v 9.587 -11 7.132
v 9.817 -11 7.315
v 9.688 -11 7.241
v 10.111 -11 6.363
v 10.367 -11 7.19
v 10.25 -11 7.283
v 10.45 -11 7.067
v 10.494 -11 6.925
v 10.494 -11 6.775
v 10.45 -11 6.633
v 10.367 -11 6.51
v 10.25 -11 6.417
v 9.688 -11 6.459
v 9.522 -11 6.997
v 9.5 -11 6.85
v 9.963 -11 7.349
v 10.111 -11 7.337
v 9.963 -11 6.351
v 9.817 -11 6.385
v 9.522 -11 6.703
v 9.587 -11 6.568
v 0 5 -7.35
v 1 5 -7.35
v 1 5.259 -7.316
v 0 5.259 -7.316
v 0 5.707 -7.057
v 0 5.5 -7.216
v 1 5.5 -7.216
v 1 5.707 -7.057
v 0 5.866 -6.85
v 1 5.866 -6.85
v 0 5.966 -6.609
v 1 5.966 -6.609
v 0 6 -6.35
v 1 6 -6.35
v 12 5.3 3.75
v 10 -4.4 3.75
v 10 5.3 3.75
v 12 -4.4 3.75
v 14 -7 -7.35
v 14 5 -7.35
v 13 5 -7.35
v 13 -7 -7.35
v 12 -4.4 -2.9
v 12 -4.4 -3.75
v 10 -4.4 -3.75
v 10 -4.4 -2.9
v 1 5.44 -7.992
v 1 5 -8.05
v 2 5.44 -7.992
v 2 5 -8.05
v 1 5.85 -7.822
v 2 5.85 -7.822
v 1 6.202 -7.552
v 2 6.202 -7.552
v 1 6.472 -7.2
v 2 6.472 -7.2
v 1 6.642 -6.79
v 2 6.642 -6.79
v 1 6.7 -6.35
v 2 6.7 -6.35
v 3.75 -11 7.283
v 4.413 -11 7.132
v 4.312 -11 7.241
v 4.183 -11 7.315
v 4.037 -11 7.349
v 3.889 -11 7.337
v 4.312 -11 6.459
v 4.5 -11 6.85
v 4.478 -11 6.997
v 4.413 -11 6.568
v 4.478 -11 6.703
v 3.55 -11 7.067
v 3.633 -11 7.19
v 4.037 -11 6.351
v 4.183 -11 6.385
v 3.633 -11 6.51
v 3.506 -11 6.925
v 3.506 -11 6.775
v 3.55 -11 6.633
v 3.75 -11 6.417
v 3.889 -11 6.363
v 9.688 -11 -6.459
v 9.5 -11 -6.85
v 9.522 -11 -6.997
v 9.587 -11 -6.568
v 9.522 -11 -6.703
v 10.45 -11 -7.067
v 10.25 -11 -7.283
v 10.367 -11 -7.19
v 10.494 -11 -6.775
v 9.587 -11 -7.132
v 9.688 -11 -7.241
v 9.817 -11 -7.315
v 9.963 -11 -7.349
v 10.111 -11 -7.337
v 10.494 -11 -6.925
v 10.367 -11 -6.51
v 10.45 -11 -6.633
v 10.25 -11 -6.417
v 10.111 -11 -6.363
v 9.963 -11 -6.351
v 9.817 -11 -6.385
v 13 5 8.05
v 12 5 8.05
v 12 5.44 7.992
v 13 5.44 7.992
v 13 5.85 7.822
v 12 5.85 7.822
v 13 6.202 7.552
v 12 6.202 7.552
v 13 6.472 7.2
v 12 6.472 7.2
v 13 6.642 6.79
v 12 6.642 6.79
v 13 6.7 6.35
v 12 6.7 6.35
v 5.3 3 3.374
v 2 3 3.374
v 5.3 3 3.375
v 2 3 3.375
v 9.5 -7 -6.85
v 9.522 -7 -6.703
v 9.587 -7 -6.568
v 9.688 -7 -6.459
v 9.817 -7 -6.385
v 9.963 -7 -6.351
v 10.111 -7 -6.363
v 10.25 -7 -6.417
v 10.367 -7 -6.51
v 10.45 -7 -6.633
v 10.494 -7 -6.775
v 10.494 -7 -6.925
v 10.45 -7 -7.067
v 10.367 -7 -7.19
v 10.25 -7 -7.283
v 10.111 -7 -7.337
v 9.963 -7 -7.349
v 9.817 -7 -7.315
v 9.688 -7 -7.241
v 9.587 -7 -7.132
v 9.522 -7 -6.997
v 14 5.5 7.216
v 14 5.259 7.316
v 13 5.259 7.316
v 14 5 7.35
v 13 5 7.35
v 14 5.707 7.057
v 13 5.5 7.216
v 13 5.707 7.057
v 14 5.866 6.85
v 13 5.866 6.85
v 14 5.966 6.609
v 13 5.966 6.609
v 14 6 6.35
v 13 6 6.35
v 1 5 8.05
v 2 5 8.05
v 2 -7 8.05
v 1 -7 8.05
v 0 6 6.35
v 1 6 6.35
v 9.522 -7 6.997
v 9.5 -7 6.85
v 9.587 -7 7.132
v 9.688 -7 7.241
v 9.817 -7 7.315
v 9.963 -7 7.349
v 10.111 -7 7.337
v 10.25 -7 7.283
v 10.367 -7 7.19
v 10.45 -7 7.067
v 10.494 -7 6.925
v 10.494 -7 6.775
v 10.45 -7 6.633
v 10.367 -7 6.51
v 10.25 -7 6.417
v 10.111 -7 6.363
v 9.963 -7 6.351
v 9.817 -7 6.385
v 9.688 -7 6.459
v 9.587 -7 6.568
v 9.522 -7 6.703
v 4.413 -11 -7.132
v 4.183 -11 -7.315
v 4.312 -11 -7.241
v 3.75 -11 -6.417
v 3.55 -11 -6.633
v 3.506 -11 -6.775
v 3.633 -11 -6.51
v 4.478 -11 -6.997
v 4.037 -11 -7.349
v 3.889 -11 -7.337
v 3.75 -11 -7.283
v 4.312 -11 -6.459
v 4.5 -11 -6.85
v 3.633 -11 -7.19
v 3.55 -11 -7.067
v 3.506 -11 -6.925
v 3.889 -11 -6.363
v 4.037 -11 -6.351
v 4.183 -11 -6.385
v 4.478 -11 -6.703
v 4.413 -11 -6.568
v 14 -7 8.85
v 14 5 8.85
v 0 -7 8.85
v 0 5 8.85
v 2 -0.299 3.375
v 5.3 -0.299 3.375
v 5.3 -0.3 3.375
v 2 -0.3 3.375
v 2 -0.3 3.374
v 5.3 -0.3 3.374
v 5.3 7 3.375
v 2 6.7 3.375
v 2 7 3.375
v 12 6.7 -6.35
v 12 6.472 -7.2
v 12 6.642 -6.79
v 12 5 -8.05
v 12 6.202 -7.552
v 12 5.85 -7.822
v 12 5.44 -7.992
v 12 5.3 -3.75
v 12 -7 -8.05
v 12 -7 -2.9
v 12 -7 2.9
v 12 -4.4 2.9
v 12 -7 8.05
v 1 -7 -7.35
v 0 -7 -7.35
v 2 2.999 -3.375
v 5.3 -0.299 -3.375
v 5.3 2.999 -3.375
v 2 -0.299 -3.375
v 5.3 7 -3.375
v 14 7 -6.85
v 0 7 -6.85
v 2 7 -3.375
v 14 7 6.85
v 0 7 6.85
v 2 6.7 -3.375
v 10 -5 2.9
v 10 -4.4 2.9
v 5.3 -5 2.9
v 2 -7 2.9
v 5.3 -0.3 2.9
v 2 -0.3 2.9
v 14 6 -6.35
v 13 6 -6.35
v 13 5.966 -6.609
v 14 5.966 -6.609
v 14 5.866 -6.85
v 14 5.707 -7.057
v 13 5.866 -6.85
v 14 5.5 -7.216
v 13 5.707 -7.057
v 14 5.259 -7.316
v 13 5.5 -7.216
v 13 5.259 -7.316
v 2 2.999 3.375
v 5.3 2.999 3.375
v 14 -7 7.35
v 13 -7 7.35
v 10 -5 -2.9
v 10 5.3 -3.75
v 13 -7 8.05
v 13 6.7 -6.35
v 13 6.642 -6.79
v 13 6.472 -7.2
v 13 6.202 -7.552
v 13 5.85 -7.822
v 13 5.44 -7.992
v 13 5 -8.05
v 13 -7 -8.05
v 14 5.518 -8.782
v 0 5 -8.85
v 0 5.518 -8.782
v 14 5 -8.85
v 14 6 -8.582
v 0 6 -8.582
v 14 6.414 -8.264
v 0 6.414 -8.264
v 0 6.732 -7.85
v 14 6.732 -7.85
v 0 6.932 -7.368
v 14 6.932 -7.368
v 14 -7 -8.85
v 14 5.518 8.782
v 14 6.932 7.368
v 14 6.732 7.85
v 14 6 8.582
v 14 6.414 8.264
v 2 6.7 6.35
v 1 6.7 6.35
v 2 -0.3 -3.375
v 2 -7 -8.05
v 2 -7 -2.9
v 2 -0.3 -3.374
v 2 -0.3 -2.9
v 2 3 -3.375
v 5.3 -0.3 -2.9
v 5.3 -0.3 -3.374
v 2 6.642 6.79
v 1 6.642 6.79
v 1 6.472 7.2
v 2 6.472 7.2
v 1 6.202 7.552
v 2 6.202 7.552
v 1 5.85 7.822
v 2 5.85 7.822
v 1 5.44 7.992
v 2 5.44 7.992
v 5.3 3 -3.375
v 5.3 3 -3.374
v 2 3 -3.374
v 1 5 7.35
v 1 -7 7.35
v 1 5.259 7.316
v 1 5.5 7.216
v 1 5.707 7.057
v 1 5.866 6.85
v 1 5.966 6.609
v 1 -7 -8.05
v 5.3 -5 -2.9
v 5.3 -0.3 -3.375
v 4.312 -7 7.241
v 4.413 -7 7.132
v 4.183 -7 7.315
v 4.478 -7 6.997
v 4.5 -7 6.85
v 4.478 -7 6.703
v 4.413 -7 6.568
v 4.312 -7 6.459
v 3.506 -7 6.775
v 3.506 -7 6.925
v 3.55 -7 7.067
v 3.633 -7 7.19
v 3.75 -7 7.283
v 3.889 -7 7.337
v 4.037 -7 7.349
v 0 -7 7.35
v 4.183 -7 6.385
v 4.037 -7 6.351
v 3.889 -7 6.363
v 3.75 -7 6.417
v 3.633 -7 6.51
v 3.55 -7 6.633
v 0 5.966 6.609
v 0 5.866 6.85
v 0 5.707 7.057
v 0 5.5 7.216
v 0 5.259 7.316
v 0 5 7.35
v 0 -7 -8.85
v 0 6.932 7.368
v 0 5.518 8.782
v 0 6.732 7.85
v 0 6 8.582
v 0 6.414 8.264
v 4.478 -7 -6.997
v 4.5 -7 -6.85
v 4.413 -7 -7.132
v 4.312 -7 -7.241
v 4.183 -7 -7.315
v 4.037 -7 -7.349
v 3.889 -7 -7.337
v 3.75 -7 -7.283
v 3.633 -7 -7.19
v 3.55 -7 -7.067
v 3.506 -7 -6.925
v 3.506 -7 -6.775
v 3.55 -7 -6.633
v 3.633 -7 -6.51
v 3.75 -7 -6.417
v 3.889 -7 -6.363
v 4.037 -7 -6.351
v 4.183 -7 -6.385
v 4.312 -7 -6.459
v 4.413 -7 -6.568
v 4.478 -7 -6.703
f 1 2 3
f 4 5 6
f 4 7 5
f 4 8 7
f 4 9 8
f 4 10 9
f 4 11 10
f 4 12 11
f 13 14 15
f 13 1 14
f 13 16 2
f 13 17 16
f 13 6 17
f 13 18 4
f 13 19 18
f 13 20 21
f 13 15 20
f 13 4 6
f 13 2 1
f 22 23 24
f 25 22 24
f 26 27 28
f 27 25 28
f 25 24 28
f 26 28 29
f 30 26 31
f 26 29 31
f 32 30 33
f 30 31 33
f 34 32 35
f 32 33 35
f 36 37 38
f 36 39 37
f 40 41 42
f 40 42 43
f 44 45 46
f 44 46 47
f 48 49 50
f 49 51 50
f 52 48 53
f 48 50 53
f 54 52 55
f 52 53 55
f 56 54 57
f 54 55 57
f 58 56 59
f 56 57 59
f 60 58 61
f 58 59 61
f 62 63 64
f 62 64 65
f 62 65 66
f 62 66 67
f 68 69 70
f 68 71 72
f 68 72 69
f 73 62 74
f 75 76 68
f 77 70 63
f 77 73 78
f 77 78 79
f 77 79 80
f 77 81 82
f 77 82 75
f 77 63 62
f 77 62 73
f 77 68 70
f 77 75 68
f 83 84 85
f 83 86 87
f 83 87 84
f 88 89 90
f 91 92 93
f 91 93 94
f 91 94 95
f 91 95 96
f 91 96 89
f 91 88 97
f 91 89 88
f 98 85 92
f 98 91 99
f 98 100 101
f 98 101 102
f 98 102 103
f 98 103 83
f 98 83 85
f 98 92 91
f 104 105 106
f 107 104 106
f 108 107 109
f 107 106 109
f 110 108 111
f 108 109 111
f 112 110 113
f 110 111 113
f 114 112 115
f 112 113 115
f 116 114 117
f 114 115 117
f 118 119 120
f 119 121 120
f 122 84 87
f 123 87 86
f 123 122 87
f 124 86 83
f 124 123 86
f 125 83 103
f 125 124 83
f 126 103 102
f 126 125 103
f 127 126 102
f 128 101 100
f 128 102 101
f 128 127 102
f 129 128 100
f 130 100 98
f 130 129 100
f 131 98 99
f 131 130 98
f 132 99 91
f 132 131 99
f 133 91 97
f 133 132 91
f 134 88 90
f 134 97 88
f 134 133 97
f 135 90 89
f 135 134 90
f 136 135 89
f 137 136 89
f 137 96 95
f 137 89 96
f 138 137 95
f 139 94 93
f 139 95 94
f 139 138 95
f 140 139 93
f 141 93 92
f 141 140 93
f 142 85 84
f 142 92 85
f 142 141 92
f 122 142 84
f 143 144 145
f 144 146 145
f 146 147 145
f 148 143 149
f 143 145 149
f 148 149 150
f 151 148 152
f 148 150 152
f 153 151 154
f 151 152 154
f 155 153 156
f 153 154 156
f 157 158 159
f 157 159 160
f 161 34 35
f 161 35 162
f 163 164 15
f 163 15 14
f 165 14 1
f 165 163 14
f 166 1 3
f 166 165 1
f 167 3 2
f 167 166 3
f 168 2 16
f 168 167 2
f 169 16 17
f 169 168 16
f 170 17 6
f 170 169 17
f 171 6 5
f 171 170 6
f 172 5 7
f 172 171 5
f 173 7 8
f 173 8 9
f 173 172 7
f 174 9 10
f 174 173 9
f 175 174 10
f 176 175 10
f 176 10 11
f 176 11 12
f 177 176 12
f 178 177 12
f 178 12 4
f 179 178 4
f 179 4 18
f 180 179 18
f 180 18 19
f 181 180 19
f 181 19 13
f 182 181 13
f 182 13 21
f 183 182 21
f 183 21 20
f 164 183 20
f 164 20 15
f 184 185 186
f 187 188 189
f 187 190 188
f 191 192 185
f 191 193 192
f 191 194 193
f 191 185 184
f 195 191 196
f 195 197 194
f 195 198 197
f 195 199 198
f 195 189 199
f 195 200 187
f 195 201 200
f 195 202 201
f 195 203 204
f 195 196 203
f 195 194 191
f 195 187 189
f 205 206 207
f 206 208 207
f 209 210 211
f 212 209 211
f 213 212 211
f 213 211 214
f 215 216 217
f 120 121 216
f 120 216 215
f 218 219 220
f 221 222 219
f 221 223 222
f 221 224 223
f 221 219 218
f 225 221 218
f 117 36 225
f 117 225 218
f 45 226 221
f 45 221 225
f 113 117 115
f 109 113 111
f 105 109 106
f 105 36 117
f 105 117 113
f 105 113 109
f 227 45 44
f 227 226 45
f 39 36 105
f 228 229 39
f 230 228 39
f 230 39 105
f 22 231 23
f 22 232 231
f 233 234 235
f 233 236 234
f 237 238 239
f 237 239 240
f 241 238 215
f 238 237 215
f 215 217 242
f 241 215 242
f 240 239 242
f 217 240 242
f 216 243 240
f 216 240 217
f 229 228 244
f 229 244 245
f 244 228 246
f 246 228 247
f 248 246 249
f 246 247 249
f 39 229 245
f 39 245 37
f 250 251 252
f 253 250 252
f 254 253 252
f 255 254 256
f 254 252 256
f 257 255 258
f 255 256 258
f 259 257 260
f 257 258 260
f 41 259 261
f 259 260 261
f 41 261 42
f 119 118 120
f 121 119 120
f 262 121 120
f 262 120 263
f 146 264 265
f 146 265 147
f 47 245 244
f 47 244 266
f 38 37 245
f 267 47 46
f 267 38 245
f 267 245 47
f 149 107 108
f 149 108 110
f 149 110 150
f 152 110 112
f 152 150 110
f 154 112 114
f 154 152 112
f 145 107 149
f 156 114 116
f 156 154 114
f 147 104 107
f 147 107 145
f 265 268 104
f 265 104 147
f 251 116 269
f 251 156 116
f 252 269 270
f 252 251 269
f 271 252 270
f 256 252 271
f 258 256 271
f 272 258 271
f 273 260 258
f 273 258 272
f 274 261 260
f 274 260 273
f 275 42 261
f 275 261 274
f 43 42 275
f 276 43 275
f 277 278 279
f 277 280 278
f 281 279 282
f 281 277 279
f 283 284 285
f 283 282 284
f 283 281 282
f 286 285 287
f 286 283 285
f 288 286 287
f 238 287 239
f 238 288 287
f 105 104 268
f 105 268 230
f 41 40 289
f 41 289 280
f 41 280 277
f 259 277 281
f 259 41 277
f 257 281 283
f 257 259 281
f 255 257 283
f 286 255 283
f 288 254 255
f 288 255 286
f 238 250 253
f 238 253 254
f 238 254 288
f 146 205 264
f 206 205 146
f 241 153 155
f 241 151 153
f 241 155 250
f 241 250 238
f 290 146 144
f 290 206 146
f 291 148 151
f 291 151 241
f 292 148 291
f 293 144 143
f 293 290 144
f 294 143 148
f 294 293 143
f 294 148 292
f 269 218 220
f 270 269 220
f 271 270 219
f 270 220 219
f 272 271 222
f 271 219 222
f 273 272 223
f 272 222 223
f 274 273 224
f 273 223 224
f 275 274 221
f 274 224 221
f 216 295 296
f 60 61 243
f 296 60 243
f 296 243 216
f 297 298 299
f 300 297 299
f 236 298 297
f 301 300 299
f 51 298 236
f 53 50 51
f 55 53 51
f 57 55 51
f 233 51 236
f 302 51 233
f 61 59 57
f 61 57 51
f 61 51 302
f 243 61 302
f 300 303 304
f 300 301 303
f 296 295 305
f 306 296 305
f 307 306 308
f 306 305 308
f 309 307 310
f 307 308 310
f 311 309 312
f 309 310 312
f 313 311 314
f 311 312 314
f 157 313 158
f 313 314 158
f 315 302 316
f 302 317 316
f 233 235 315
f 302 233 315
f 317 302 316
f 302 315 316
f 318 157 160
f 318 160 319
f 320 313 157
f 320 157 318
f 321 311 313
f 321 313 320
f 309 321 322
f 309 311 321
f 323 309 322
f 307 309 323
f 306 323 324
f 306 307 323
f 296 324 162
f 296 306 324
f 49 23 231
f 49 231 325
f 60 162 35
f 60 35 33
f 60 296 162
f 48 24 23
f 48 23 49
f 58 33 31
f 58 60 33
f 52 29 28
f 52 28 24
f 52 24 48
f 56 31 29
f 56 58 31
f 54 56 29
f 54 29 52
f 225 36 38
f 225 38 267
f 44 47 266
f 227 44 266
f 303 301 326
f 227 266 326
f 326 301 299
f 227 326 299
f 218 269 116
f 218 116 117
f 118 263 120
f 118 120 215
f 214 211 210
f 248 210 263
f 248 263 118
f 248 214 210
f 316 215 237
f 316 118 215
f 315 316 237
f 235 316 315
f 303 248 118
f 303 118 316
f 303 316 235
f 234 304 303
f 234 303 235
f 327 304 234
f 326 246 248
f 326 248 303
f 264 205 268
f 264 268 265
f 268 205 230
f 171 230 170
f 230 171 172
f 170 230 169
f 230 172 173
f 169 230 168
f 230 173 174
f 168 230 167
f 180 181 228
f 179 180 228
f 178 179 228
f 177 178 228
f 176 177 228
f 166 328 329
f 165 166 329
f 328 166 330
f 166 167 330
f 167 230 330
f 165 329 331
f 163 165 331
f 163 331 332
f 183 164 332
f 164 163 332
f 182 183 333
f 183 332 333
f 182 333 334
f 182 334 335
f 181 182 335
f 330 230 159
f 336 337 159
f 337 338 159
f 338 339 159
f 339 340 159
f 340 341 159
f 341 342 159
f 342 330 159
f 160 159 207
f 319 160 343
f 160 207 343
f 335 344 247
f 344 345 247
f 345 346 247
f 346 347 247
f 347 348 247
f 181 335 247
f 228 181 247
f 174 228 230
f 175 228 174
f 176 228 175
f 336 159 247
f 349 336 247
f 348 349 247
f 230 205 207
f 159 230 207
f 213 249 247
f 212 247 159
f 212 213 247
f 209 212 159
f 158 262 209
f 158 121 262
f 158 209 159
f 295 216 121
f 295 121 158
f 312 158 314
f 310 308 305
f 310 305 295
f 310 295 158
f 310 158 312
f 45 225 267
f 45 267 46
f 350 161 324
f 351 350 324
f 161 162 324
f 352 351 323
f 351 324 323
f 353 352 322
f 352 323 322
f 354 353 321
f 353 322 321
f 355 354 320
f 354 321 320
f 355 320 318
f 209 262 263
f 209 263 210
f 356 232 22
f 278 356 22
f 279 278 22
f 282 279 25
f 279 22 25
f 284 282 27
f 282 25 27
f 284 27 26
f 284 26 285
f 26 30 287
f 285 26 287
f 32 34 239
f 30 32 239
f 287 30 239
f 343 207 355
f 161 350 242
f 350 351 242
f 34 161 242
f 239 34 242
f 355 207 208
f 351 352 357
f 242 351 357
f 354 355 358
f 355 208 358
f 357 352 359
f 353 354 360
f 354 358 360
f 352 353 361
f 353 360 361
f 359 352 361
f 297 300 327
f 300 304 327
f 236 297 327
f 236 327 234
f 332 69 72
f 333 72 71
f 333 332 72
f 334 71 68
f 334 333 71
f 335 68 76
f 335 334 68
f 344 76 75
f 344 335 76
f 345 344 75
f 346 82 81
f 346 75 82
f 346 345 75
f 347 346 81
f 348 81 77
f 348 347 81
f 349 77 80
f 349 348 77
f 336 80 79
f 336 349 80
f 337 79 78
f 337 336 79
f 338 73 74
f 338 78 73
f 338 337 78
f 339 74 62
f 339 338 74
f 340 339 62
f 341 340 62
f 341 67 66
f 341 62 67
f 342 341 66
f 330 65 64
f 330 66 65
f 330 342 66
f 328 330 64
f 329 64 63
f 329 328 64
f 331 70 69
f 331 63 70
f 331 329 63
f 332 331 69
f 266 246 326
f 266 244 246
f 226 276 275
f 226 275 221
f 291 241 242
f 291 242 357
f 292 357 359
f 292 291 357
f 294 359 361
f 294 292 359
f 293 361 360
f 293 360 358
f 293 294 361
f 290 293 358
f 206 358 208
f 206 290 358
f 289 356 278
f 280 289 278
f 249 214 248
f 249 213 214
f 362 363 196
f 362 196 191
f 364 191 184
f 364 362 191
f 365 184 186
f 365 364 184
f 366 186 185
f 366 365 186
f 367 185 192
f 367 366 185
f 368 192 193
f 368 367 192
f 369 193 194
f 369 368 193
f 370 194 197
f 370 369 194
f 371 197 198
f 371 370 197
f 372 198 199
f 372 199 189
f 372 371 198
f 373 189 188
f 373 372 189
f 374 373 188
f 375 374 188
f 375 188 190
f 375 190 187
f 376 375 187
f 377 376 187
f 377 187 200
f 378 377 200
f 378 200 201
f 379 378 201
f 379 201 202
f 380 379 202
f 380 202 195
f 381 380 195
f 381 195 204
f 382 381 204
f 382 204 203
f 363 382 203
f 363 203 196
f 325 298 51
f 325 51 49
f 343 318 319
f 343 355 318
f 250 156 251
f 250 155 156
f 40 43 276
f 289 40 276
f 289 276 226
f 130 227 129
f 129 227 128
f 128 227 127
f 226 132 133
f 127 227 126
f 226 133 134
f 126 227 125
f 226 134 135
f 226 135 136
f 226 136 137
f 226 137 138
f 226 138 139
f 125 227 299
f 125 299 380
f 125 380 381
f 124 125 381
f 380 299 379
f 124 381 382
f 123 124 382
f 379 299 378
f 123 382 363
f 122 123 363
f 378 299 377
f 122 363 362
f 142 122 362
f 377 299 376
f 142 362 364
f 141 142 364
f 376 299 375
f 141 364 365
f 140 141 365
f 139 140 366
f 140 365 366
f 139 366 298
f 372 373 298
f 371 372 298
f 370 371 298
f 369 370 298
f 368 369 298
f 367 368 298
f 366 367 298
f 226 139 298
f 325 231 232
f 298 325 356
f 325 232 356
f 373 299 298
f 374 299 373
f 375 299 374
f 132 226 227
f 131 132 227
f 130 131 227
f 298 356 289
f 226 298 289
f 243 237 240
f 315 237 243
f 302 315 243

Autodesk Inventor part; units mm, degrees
ref_plane "YZ Plane" through (0, 0, 0) normal (1, 0, 0) x (0, 1, 0)
ref_plane "XZ Plane" through (0, 0, 0) normal (0, 1, 0) x (-1, 0, 0)
ref_plane "XY Plane" through (0, 0, 0) normal (0, 0, 1) x (1, 0, 0)
sketch "Sketch1" plane through (0, 0, 0) normal (1, 0, 0) x (0, 1, 0)
  point P0 (0, 0)
sketch "Sketch2" plane through (0, 0, 0) normal (1, 0, 0) x (0, 1, 0)
  line L0 (7, 8.85) -> (-7, 8.85)
  line L1 (-7, 8.85) -> (-7, -8.85)
  line L2 (-7, -8.85) -> (7, -8.85)
  line L3 (7, -8.85) -> (7, 8.85)
  point P0 (0, 0)
  dimension "d0" = 17.7
  dimension "d1" = 14
  dimension "d2" = 8.85
  dimension "d3" = 7
extrude "Extrusion1" add sketch "Sketch2" along normal blind 14
fillet "Fillet1" radius 2 2 edges at (7, 7, 8.85) (7, 7, -8.85)
sketch "Sketch5" plane through (14, 0, 0) normal (1, 0, 0) x (0, 0, -1)
  line L0 (-7.35, 6) -> (7.35, 6)
  line L1 (7.35, 6) -> (7.35, -7)
  line L2 (7.35, -7) -> (-7.35, -7)
  line L3 (-7.35, -7) -> (-7.35, 6)
  line L4 (6.85, 7) -> (-6.85, 7) projected
  line L5 (8.85, -7) -> (8.85, 5) projected
  line L6 (-8.85, -7) -> (8.85, -7) projected
  line L7 (-8.85, 5) -> (-8.85, -7) projected
  point P0 (0, 0)
  dimension "d19" = 1
  dimension "d20" = 1.5
  dimension "d21" = 0
  dimension "d22" = 1.5
extrude "Extrusion2" cut sketch "Sketch5" against normal blind 2
fillet "Fillet2" radius 1 1 edges at (13, 6, 7.35)
fillet "Fillet3" radius 1 1 edges at (13, 6, -7.35)
sketch "Sketch6" plane through (12, 0, 0) normal (1, 0, 0) x (0, 0, -1)
  line L0 (-3.75, 5.3) -> (3.75, 5.3)
  line L1 (3.75, 5.3) -> (3.75, -4.4)
  line L2 (3.75, -4.4) -> (-3.75, -4.4)
  line L3 (-3.75, -4.4) -> (-3.75, 5.3)
  line L4 (-6.35, 6) -> (6.35, 6) projected
  line L5 (7.35, -7) -> (-7.35, -7) projected
  line L6 (-7.35, -7) -> (-7.35, 5) projected
  line L7 (7.35, 5) -> (7.35, -7) projected
  point P0 (0, 0)
  dimension "d27" = 9.7
  dimension "d28" = 7.5
  dimension "d35" = 0.7
  dimension "d36" = 2.6
  dimension "d107" = 3.75
extrude "Extrusion3" cut sketch "Sketch6" against normal blind 2
ref_plane "Work Plane2" through (7, 0, 0) normal (1, 0, 0) x (0, 0, -1)
mirror "Mirror1" about plane through (7, 0, 0) normal (1, 0, 0) of "Extrusion2"
sketch "Sketch11" plane through (2, -7, -7.35) normal (-1, 0, 0) x (0, 0, 1)
  line L0 (4.45, 2) -> (10.25, 2)
  line L1 (10.25, 2) -> (10.25, 6.7)
  line L2 (10.25, 6.7) -> (4.45, 6.7)
  line L3 (4.45, 6.7) -> (4.45, 2)
  line L4 (10.725, 6.7) -> (3.975, 6.7)
  line L5 (3.975, 6.7) -> (3.975, 10)
  line L6 (3.975, 10) -> (10.725, 10)
  line L7 (10.725, 10) -> (10.725, 6.7)
  line L8 (14.7, 0) -> (0, 0) projected
  point P0 (7.35, 7)
  point P1 (10.25, 6.7)
  dimension "d52" = 5.8
  dimension "d53" = 4.7
  dimension "d54" = 2
  dimension "d55" = 3.3
  dimension "d56" = 6.75
  dimension "d57" = 2.9
  dimension "d58" = 3.375
extrude "Extrusion5" cut sketch "Sketch11" against normal blind 3.3
fillet "Fillet4" radius 0.001 2 edges at (3.65, 3, -3.375) (3.65, 3, 3.375)
fillet "Fillet5" radius 0.001 2 edges at (3.65, -0.3, -3.375) (3.65, -0.3, 3.375)
fillet "Fillet6" radius 1 1 edges at (1, 6, 7.35)
fillet "Fillet7" radius 1 1 edges at (1, 6, -7.35)
sketch "Sketch15" plane through (0, -7, -8.85) normal (0, -1, 0) x (1, 0, 0)
  line L0 (0, 2) -> (14, 2) projected
  circle A0 centre (4, 2) radius 0.5
  line L1 (0, 1.5) -> (0, 0) projected
  line L2 (12, 1.5) -> (12, 16.2) projected
  line L3 (2, 16.2) -> (2, 1.5) projected
  line L4 (7, 21.24) -> (7, -3.54) projected
  point P0 (0, 8.85)
  point P1 (12, 3.75)
  point P2 (2, 3.35)
  dimension "d74" = 1
  dimension "d120" = 4
extrude "Extrusion8" add sketch "Sketch15" along normal blind 4
mirror "Mirror3" about plane through (0, 0, 0) normal (0, 0, 1) of "Extrusion8"
mirror "Mirror4" about plane through (7, 0, 0) normal (1, 0, 0) of "Extrusion8", "Mirror3"
sketch "Sketch18" plane through (2, 3, -3.374) normal (0, -1, 0) x (1, 0, 0)
  line L0 (3.3, -0.001) -> (0, -0.001)
  line L1 (0, -0.001) -> (0, 6.749)
  line L2 (0, 6.749) -> (3.3, 6.749)
  line L3 (3.3, 6.749) -> (3.3, -0.001)
  line L4 (0, -0.001) -> (3.3, -0.001) projected
  line L5 (3.3, 6.749) -> (0, 6.749) projected
  line L6 (0, 0) -> (0, 6.748) projected
  line L7 (3.3, 0) -> (3.3, 6.748) projected
  point P0 (-2, 3.374)
extrude "Extrusion9" cut sketch "Sketch18" against normal through all
sketch "Sketch19" plane through (0, -7, 8.85) normal (0, -1, 0) x (1, 0, 0)
  line L0 (13, -0.8) -> (12, -0.8)
  line L1 (12, -0.8) -> (12, -1.5)
  line L2 (12, -1.5) -> (13, -1.5)
  line L3 (13, -1.5) -> (13, -0.8)
  point P0 (0, -8.85)
  dimension "d103" = 0.7
  dimension "d104" = 1
sketch3d "3D Sketch3"
  line L0 (14, -7, 7.35) -> (14, 5, 7.35)
  arc A0 (14, 5, 7.35) -> (14, 6, 6.35) centre (14, 5, 6.35) ccw
  line L1 (14, 6, 6.35) -> (14, 6, -6.35)
  arc A1 (14, 6, -6.35) -> (14, 5, -7.35) centre (14, 5, -6.35) ccw
  line L2 (14, 5, -7.35) -> (14, -7, -7.35)
sweep "Sweep3" cut profiles "Sketch19" path "3D Sketch3"
mirror "Mirror6" about plane through (7, 0, 0) normal (1, 0, 0) of "Sweep3"
sketch "Sketch20" plane through (12, 0, 0) normal (1, 0, 0) x (0, 0, -1)
  line L0 (-2.9, -5) -> (2.9, -5)
  line L1 (2.9, -5) -> (2.9, -7)
  line L2 (2.9, -7) -> (-2.9, -7)
  line L3 (-2.9, -7) -> (-2.9, -5)
  line L4 (3.6, 4.6) -> (3.6, -4.3)
  line L5 (-3.6, -4.3) -> (-3.6, 5.3)
  line L6 (3.6, -4.3) -> (-3.6, -4.3)
  line L7 (5.45, -7) -> (-5.45, -7)
  point P0 (0, 0)
  dimension "d109" = 0.7
  dimension "d110" = 0.7
  dimension "d116" = 2
extrude "Extrusion10" cut sketch "Sketch20" against normal through all
sketch "Sketch21" plane through (12, 0, 0) normal (1, 0, 0) x (0, 0, -1)
  line L0 (-2.9, -4.4) -> (2.9, -4.4)
  line L1 (2.9, -4.4) -> (2.9, -5)
  line L2 (2.9, -5) -> (-2.9, -5)
  line L3 (-2.9, -5) -> (-2.9, -4.4)
  line L4 (3.75, -4.4) -> (-3.75, -4.4) projected
  line L5 (-2.9, -5) -> (2.9, -5) projected
  line L6 (2.9, -5) -> (2.9, -7) projected
  line L7 (-2.9, -7) -> (-2.9, -5) projected
  point P0 (0, 0)
extrude "Extrusion11" cut sketch "Sketch21" against normal blind 2
equation "\"d2\" = 0.5 * d0"
equation "\"d3\" = 0.5 * d1"
equation "\"d107\" = 0.5 * d28"
equation "\"d57\" = 0.5 * d52"
equation "\"d58\" = 0.5 * d56"
properties part number "fingertip skeleton 5"
